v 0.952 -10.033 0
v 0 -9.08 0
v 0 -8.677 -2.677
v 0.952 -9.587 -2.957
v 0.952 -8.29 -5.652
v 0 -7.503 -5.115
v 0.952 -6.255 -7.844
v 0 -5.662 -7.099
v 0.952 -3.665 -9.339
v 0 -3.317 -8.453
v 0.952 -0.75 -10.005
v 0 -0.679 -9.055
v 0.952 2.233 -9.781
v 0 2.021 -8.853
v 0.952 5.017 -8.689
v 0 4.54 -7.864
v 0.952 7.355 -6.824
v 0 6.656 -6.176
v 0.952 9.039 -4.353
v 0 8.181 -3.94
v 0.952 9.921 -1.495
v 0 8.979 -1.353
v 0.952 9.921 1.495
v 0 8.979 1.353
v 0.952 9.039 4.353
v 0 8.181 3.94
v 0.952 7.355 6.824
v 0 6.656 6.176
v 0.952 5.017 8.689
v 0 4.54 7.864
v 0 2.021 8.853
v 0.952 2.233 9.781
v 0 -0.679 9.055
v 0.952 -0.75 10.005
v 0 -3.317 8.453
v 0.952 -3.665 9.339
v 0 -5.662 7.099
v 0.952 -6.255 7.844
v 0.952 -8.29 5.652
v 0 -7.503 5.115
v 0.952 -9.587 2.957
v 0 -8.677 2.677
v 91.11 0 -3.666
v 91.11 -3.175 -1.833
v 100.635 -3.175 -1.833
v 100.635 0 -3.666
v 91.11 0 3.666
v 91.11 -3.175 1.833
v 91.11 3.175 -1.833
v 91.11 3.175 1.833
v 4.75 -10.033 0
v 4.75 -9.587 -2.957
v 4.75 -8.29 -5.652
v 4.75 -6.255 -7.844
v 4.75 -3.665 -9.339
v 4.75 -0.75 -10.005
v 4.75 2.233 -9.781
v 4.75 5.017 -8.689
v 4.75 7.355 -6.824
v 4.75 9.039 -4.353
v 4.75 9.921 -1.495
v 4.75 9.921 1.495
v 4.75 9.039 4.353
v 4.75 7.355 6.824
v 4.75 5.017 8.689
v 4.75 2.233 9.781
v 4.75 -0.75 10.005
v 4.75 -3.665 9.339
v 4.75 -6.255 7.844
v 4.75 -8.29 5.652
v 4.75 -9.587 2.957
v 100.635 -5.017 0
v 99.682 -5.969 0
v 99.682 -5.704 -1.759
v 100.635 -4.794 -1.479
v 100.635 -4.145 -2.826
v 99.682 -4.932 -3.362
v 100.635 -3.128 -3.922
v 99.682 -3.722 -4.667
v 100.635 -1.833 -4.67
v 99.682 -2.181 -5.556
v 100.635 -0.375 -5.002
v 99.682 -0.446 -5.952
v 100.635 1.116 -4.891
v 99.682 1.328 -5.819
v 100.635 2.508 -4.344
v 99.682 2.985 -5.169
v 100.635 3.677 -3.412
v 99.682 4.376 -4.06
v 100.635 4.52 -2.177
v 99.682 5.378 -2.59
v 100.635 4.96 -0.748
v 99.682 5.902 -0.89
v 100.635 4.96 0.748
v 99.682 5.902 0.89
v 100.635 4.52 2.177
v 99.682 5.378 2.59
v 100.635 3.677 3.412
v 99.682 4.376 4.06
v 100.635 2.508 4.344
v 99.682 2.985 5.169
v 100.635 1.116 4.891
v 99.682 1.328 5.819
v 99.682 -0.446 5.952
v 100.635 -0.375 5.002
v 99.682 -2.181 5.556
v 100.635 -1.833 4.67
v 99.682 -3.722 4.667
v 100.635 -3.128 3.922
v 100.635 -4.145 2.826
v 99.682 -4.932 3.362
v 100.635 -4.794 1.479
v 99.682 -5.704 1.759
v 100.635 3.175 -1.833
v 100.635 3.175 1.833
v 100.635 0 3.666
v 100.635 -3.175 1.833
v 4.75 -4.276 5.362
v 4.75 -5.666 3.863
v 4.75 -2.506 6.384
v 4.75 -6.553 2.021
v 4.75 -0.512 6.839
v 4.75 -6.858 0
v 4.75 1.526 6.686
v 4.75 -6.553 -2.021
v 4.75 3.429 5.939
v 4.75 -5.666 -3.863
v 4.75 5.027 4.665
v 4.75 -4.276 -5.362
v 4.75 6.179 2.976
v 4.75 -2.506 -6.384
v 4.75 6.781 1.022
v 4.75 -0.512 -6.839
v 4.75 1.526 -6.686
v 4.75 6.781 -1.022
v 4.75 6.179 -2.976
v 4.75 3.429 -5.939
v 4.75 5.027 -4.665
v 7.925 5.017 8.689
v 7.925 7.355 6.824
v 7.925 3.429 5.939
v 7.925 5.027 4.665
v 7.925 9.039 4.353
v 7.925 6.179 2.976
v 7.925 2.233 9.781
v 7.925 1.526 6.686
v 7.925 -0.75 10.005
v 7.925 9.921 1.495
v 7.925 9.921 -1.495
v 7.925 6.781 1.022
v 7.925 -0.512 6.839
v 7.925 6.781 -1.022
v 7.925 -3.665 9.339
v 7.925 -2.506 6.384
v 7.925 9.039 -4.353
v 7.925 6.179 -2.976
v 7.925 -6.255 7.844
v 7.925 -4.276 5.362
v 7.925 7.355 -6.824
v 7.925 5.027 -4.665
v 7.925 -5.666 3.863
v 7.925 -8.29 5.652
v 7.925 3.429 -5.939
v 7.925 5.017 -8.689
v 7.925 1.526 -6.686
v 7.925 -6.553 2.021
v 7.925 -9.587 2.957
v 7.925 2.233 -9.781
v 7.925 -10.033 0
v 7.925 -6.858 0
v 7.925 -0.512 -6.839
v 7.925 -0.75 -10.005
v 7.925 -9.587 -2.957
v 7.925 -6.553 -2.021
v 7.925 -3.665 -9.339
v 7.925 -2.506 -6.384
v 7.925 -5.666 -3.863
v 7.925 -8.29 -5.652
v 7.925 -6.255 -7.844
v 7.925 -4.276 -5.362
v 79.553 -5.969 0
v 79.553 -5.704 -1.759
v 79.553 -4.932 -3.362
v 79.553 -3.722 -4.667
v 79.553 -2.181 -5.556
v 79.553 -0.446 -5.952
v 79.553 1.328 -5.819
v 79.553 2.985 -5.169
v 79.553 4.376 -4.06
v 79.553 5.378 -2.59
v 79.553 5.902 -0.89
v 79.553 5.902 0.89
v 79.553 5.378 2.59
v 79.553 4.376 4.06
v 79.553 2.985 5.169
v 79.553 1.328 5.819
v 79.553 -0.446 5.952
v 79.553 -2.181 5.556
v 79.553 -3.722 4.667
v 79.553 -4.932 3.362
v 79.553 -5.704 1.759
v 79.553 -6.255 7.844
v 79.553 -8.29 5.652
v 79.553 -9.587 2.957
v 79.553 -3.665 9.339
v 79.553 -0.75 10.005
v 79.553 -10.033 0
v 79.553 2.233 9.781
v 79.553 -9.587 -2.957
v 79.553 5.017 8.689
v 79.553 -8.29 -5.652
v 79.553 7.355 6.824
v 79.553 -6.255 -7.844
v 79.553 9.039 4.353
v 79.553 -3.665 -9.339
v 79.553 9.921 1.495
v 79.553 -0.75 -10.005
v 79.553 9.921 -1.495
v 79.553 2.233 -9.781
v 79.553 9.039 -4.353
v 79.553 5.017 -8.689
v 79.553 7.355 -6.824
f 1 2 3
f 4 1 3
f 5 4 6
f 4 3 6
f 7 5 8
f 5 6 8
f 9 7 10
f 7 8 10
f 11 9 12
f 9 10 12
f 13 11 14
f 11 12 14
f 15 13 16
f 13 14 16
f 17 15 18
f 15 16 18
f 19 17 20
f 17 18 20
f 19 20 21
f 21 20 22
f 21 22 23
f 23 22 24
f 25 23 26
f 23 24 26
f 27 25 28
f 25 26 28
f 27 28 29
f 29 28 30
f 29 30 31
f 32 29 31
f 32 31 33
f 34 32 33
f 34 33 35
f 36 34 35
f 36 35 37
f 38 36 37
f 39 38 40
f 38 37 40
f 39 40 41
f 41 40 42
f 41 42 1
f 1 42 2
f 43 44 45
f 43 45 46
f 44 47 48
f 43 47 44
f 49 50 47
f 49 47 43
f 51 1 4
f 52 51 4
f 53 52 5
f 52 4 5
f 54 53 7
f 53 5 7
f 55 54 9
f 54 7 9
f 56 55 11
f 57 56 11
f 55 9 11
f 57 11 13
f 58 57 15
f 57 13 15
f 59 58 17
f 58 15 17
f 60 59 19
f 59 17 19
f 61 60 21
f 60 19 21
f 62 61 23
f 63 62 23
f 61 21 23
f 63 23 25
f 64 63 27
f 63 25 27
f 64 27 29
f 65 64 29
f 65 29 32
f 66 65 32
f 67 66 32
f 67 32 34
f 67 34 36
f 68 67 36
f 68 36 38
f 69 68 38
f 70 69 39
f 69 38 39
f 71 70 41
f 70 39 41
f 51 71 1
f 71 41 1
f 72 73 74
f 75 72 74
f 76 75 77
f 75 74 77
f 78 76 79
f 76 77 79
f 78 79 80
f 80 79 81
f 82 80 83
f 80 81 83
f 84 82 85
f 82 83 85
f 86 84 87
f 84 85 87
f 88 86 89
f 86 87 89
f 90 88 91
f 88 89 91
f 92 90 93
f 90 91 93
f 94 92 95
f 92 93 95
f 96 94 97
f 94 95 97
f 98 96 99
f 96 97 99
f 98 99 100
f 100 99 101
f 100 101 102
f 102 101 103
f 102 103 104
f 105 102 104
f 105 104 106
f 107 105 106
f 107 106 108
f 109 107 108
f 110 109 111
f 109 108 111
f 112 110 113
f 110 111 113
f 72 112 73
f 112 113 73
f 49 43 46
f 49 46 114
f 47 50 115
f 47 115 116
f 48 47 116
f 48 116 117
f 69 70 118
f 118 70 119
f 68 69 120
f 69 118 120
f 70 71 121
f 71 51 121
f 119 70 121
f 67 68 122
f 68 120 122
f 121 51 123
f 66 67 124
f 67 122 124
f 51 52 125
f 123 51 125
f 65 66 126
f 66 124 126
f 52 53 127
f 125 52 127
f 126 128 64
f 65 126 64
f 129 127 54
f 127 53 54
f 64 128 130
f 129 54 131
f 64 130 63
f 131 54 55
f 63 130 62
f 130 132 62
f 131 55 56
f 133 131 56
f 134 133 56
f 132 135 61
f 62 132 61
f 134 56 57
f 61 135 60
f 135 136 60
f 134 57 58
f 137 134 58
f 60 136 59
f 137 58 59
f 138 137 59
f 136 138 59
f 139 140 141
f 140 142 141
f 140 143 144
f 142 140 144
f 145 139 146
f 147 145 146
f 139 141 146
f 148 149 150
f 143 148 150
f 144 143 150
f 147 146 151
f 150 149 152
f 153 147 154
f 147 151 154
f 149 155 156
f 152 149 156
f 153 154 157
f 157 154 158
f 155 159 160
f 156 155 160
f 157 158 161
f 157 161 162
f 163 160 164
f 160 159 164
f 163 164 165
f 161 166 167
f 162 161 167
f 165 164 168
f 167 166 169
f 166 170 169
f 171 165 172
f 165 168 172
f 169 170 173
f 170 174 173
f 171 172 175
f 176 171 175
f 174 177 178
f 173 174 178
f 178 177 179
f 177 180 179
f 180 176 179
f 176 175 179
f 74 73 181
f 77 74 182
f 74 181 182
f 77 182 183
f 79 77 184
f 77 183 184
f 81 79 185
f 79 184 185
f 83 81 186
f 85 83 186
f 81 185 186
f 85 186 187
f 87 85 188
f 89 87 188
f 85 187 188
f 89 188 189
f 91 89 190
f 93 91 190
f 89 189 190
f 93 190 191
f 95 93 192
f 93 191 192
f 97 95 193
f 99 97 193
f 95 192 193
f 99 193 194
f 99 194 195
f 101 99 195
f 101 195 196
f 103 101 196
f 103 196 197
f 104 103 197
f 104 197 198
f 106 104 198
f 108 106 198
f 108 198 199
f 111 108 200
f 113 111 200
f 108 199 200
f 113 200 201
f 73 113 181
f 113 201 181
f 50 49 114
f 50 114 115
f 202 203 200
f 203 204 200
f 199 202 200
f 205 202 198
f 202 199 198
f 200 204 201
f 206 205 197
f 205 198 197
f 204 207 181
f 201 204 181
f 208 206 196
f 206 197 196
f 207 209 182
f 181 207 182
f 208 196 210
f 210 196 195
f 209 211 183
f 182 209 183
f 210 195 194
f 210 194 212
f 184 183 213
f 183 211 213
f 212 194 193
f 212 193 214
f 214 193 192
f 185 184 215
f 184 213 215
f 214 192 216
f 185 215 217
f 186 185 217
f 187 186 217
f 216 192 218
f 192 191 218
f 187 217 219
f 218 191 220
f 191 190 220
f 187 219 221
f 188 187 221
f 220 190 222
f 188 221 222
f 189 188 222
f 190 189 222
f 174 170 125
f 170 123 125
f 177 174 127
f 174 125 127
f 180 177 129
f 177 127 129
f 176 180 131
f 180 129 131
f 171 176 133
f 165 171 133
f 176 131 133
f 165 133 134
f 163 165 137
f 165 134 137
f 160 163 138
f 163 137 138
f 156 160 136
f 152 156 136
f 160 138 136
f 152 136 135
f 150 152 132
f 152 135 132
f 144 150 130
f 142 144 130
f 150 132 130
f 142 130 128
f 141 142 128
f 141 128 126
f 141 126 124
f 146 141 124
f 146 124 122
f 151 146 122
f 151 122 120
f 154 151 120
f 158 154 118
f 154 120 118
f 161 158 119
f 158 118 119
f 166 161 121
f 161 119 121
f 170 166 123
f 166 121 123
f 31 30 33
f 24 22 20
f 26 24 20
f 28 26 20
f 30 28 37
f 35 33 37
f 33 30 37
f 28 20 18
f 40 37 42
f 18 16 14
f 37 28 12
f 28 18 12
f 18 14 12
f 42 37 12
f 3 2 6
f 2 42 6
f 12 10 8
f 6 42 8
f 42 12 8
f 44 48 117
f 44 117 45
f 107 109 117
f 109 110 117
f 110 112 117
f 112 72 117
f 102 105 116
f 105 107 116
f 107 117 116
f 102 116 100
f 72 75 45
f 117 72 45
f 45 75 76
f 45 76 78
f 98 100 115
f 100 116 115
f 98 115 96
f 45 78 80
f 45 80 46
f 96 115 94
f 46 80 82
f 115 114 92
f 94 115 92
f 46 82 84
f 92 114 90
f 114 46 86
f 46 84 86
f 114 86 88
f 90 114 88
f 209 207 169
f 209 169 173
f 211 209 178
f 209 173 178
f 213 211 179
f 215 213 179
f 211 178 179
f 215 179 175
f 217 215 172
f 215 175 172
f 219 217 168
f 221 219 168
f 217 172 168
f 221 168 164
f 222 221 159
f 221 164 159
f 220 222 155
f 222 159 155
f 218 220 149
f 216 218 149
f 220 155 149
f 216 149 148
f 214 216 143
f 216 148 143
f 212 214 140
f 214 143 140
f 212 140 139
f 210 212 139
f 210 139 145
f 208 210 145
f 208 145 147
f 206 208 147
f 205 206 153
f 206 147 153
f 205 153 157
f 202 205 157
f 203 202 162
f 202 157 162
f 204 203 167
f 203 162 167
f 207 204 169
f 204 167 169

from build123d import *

# Parameters (mm, degrees)
CUT_EXTRUDE1_DEPTH = 9.525
CHAMFER1_SIZE      = 0.9525


with BuildPart() as part:
    # Sketch1 → Revolve1 (revolve)
    with BuildSketch(Plane.XY, mode=Mode.PRIVATE) as revolve1_sk:
        Polygon((0, 0), (100.6348, 0), (100.6348, 5.969), (79.5528, 5.969), (79.5528, 10.033), (7.9248, 10.033), (7.9248, 6.858), (4.7498, 6.858), (4.7498, 10.033), (0, 10.033), align=None)
    revolve(revolve1_sk.sketch.rotate(Axis((0, 0, 0), (1, 0, 0)), 180), axis=Axis((0, 0, 0), (1, 0, 0)))

    # Sketch2 → Cut-Extrude1 (cut)
    with BuildSketch(Plane(origin=(100.6348, 0, 0), x_dir=(0, 0, -1), z_dir=(1, 0, 0))):
        Polygon((3.666174209, 0), (1.833087105, 3.175), (-1.833087105, 3.175), (-3.666174209, 0), (-1.833087105, -3.175), (1.833087105, -3.175), align=None)
    extrude(amount=-CUT_EXTRUDE1_DEPTH, mode=Mode.SUBTRACT)

    # Chamfer1
    chamfer1_edges = [part.edges().sort_by_distance(p)[0] for p in [
        (100.6348, 5.969, 0),
        (0, 10.033, 0),
    ]]
    chamfer(chamfer1_edges, length=CHAMFER1_SIZE)


solid = part.part
